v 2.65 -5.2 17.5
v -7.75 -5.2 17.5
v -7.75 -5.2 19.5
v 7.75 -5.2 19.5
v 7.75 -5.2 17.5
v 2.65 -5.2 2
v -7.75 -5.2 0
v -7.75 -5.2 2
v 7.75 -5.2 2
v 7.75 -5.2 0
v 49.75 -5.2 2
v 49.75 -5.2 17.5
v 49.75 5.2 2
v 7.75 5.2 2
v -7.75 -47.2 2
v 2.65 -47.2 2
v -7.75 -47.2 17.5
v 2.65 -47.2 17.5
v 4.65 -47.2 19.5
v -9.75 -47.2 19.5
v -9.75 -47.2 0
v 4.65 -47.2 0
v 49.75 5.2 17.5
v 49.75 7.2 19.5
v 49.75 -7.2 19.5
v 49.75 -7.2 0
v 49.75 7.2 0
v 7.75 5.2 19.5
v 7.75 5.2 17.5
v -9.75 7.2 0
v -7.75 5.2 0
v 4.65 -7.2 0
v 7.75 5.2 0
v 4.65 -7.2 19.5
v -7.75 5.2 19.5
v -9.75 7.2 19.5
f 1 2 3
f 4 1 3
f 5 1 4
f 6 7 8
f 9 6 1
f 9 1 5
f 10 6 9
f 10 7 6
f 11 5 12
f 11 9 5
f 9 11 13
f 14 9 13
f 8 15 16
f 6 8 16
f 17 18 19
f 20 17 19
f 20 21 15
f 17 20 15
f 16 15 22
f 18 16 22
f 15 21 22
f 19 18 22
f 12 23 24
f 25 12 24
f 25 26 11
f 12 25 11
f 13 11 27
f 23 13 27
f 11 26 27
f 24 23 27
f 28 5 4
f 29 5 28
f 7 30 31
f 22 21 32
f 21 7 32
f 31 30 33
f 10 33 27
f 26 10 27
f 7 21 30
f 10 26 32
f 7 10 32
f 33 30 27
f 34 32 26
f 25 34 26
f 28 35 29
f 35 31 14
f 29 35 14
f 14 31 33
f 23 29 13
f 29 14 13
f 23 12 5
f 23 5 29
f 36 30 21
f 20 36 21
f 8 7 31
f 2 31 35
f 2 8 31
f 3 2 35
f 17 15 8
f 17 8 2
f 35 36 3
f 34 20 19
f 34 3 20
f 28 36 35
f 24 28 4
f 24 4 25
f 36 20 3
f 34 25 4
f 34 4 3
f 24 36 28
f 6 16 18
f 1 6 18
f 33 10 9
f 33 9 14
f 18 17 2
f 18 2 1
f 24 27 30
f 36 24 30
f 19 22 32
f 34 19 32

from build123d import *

# Parameters (mm, degrees)
SKETCH004_W     = 15.5
SKETCH004_H     = 10.4
PAD003_DEPTH    = 19.5
SKETCH005_W     = 10.4
SKETCH005_H     = 15.5
POCKET_DEPTH    = 45
SKETCH006_W     = 10.4
SKETCH006_H     = 15.5
POCKET001_DEPTH = 45


with BuildPart() as part:
    # Sketch004 → Pad003 (new body)
    with BuildSketch(Plane.XY):
        Polygon((-9.75, 7.2), (-9.75, -47.2), (4.65, -47.2), (4.65, -7.2), (49.75, -7.2), (49.75, 7.2), align=None)
        Rectangle(SKETCH004_W, SKETCH004_H, mode=Mode.SUBTRACT)
    extrude(amount=PAD003_DEPTH)

    # Sketch005 (on Face2 of Pad003) → Pocket (cut)
    with BuildSketch(Plane.XZ.offset(47.2)):
        with Locations((-2.55, 9.75)):
            Rectangle(SKETCH005_W, SKETCH005_H)
    extrude(amount=-POCKET_DEPTH, mode=Mode.SUBTRACT)

    # Sketch006 (on Face6 of Pocket) → Pocket001 (cut)
    with BuildSketch(Plane.YZ.offset(49.75)):
        with Locations((0, 9.75)):
            Rectangle(SKETCH006_W, SKETCH006_H)
    extrude(amount=-POCKET001_DEPTH, mode=Mode.SUBTRACT)


solid = part.part
